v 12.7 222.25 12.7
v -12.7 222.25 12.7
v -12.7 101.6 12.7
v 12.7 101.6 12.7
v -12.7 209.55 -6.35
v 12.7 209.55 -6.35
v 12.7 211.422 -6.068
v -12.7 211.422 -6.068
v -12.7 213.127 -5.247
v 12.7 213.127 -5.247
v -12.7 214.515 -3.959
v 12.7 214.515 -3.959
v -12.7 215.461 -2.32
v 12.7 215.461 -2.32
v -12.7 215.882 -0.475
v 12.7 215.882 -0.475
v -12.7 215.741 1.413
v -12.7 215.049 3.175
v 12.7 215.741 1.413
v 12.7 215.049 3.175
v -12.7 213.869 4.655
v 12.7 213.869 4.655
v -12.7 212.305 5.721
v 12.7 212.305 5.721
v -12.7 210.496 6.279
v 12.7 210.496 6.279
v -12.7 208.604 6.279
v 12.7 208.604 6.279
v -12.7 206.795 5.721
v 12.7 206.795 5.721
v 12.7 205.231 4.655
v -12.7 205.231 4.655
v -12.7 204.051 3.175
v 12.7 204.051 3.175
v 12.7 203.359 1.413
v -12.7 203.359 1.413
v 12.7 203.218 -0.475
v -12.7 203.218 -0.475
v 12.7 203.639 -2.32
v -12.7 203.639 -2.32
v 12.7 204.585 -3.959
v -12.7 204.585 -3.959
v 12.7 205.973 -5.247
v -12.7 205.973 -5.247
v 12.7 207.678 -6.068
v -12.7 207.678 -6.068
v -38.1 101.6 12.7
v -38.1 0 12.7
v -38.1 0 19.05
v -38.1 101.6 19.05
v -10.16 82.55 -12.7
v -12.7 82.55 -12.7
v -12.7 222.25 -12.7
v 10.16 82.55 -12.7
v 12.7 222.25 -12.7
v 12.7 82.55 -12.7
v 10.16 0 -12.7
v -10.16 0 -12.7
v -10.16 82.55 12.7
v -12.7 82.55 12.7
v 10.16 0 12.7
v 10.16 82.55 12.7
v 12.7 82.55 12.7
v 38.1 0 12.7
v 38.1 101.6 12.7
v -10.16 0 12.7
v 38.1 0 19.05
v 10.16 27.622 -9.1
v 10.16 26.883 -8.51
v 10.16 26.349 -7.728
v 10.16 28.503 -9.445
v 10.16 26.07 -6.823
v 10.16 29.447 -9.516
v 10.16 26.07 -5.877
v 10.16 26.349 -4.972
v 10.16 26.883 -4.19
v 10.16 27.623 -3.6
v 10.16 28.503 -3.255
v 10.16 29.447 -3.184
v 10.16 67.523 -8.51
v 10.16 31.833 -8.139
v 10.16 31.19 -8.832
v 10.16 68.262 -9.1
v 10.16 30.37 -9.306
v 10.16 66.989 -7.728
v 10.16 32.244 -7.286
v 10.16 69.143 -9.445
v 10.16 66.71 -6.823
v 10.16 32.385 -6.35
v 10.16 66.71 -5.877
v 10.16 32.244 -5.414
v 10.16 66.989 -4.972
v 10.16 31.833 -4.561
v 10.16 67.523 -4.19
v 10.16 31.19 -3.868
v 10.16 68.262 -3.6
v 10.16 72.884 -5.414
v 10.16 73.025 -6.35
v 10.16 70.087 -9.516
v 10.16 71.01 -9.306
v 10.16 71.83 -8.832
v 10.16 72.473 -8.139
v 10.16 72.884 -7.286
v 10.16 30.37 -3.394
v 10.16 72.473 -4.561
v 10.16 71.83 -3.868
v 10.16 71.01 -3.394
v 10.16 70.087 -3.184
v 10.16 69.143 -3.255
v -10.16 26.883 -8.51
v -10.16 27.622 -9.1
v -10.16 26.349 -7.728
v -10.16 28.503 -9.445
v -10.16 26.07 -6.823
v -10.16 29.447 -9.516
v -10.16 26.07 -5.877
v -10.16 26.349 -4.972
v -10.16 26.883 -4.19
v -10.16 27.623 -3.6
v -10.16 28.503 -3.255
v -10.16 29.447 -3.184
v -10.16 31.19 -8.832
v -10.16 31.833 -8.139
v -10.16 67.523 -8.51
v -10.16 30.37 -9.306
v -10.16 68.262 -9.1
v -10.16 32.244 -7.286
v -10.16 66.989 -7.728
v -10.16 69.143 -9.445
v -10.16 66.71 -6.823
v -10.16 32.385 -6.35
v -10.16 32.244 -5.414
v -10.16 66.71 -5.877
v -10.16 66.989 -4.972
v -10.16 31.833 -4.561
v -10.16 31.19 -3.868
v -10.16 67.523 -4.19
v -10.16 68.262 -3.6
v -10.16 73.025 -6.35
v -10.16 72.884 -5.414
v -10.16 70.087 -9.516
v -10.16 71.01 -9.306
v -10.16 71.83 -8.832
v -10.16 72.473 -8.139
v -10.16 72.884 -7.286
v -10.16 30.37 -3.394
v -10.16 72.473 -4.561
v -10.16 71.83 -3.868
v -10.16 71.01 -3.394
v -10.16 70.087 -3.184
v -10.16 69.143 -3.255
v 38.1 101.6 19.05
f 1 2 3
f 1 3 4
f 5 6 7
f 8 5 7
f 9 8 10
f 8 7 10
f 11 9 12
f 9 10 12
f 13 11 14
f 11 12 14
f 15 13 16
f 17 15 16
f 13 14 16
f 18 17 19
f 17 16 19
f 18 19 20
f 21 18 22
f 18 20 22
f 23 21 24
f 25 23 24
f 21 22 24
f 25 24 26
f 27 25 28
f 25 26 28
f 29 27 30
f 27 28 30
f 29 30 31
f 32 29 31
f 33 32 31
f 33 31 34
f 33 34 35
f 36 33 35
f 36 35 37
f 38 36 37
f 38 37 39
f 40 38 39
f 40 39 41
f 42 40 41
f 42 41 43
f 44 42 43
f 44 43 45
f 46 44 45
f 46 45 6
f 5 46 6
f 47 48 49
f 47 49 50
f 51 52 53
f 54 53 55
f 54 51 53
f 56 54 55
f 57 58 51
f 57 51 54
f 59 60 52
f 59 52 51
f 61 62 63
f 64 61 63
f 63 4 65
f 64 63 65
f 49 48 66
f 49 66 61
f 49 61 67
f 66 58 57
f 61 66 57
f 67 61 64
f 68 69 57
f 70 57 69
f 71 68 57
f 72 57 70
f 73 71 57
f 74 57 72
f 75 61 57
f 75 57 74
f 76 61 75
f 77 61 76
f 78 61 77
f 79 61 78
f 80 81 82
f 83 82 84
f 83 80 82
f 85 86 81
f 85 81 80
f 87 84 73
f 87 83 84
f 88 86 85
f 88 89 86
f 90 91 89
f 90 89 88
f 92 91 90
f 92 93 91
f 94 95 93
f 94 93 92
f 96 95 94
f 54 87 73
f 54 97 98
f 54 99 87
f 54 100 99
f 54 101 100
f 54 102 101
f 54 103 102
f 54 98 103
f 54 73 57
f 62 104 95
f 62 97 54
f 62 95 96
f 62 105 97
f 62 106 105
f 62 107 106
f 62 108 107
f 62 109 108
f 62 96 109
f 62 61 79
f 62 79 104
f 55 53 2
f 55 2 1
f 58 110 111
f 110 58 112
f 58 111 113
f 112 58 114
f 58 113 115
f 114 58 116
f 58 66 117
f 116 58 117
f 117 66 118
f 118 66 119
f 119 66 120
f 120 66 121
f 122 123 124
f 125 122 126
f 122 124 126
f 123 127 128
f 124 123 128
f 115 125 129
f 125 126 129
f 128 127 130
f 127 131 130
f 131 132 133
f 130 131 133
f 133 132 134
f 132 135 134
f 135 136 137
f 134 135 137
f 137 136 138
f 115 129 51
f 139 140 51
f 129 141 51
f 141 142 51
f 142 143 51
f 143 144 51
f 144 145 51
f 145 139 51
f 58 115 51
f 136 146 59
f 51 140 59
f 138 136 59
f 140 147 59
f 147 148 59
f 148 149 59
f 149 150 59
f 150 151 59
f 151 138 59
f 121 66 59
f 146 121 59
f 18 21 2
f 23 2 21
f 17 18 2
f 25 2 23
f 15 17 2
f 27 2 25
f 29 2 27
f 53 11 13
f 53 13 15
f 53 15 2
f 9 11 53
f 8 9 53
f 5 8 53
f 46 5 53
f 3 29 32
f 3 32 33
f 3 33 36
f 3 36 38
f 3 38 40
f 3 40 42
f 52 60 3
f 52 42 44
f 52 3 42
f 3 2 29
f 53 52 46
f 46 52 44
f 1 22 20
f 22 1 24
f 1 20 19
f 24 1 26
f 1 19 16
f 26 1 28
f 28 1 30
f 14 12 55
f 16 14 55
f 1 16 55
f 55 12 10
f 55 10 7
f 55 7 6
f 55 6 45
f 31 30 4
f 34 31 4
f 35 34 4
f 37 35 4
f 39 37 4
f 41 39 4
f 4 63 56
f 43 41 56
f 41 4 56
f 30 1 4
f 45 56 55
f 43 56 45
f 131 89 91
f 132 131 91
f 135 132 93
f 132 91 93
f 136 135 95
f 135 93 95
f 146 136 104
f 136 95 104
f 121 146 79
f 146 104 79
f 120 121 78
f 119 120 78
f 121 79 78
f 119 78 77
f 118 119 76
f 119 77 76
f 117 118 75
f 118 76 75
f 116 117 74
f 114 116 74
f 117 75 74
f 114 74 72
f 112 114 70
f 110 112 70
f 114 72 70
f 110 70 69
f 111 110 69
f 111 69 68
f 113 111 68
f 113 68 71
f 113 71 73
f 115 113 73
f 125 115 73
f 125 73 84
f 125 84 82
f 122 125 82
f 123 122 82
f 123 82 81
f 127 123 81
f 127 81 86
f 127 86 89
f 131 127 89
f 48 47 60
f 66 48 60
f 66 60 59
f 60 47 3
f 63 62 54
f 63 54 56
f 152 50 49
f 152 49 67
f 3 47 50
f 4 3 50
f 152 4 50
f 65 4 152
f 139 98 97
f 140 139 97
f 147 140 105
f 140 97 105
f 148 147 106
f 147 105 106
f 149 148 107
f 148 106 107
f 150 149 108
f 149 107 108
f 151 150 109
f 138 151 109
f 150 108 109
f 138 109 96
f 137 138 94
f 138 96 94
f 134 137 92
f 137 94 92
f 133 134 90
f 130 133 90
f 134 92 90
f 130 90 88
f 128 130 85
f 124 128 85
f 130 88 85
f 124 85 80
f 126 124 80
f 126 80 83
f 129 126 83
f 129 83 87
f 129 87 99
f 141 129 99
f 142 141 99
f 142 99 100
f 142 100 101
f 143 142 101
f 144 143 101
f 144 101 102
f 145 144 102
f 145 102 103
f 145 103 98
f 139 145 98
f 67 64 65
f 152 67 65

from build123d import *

# Parameters (mm, degrees)
SKETCH1_W           = 25.4
SKETCH1_H           = 25.4
BOSS_EXTRUDE1_DEPTH = 222.25
SKETCH2_W           = 2.54
SKETCH2_H           = 82.55
CUT_EXTRUDE1_DEPTH  = 222.25
SKETCH3_R           = 6.35
SKETCH3_R_2         = 3.175
CUT_EXTRUDE2_DEPTH  = 222.25
SKETCH4_W           = 76.2
SKETCH4_H           = 101.6
BOSS_EXTRUDE3_DEPTH = 6.35


with BuildPart() as part:
    # Sketch1 → Boss-Extrude1 (new body)
    with BuildSketch(Plane(origin=(0, 0, 0), x_dir=(1, 0, 0), z_dir=(0, 1, 0))):
        Rectangle(SKETCH1_W, SKETCH1_H)
    extrude(amount=BOSS_EXTRUDE1_DEPTH)

    # Sketch2 → Cut-Extrude1 (cut)
    with BuildSketch(Plane.XY.offset(12.7)):
        with Locations((-11.43, 41.275)):
            Rectangle(SKETCH2_W, SKETCH2_H)
        with Locations((11.43, 41.275)):
            Rectangle(SKETCH2_W, SKETCH2_H)
    extrude(amount=-CUT_EXTRUDE1_DEPTH, mode=Mode.SUBTRACT)

    # Sketch3 → Cut-Extrude2 (cut)
    with BuildSketch(Plane(origin=(12.7, 0, 0), x_dir=(0, 0, -1), z_dir=(1, 0, 0))):
        with Locations((0, 209.55)):
            Circle(SKETCH3_R)
        with Locations(Location((6.35, 69.85, 0), (0, 0, 90))):
            Circle(SKETCH3_R_2)
        with Locations(Location((6.35, 29.21, 0), (0, 0, 90))):
            Circle(SKETCH3_R_2)
    extrude(amount=-CUT_EXTRUDE2_DEPTH, mode=Mode.SUBTRACT)

    # Sketch4 → Boss-Extrude3 (add)
    with BuildSketch(Plane.XY.offset(12.7)):
        with Locations((0, 50.8)):
            Rectangle(SKETCH4_W, SKETCH4_H)
    extrude(amount=BOSS_EXTRUDE3_DEPTH)


solid = part.part
